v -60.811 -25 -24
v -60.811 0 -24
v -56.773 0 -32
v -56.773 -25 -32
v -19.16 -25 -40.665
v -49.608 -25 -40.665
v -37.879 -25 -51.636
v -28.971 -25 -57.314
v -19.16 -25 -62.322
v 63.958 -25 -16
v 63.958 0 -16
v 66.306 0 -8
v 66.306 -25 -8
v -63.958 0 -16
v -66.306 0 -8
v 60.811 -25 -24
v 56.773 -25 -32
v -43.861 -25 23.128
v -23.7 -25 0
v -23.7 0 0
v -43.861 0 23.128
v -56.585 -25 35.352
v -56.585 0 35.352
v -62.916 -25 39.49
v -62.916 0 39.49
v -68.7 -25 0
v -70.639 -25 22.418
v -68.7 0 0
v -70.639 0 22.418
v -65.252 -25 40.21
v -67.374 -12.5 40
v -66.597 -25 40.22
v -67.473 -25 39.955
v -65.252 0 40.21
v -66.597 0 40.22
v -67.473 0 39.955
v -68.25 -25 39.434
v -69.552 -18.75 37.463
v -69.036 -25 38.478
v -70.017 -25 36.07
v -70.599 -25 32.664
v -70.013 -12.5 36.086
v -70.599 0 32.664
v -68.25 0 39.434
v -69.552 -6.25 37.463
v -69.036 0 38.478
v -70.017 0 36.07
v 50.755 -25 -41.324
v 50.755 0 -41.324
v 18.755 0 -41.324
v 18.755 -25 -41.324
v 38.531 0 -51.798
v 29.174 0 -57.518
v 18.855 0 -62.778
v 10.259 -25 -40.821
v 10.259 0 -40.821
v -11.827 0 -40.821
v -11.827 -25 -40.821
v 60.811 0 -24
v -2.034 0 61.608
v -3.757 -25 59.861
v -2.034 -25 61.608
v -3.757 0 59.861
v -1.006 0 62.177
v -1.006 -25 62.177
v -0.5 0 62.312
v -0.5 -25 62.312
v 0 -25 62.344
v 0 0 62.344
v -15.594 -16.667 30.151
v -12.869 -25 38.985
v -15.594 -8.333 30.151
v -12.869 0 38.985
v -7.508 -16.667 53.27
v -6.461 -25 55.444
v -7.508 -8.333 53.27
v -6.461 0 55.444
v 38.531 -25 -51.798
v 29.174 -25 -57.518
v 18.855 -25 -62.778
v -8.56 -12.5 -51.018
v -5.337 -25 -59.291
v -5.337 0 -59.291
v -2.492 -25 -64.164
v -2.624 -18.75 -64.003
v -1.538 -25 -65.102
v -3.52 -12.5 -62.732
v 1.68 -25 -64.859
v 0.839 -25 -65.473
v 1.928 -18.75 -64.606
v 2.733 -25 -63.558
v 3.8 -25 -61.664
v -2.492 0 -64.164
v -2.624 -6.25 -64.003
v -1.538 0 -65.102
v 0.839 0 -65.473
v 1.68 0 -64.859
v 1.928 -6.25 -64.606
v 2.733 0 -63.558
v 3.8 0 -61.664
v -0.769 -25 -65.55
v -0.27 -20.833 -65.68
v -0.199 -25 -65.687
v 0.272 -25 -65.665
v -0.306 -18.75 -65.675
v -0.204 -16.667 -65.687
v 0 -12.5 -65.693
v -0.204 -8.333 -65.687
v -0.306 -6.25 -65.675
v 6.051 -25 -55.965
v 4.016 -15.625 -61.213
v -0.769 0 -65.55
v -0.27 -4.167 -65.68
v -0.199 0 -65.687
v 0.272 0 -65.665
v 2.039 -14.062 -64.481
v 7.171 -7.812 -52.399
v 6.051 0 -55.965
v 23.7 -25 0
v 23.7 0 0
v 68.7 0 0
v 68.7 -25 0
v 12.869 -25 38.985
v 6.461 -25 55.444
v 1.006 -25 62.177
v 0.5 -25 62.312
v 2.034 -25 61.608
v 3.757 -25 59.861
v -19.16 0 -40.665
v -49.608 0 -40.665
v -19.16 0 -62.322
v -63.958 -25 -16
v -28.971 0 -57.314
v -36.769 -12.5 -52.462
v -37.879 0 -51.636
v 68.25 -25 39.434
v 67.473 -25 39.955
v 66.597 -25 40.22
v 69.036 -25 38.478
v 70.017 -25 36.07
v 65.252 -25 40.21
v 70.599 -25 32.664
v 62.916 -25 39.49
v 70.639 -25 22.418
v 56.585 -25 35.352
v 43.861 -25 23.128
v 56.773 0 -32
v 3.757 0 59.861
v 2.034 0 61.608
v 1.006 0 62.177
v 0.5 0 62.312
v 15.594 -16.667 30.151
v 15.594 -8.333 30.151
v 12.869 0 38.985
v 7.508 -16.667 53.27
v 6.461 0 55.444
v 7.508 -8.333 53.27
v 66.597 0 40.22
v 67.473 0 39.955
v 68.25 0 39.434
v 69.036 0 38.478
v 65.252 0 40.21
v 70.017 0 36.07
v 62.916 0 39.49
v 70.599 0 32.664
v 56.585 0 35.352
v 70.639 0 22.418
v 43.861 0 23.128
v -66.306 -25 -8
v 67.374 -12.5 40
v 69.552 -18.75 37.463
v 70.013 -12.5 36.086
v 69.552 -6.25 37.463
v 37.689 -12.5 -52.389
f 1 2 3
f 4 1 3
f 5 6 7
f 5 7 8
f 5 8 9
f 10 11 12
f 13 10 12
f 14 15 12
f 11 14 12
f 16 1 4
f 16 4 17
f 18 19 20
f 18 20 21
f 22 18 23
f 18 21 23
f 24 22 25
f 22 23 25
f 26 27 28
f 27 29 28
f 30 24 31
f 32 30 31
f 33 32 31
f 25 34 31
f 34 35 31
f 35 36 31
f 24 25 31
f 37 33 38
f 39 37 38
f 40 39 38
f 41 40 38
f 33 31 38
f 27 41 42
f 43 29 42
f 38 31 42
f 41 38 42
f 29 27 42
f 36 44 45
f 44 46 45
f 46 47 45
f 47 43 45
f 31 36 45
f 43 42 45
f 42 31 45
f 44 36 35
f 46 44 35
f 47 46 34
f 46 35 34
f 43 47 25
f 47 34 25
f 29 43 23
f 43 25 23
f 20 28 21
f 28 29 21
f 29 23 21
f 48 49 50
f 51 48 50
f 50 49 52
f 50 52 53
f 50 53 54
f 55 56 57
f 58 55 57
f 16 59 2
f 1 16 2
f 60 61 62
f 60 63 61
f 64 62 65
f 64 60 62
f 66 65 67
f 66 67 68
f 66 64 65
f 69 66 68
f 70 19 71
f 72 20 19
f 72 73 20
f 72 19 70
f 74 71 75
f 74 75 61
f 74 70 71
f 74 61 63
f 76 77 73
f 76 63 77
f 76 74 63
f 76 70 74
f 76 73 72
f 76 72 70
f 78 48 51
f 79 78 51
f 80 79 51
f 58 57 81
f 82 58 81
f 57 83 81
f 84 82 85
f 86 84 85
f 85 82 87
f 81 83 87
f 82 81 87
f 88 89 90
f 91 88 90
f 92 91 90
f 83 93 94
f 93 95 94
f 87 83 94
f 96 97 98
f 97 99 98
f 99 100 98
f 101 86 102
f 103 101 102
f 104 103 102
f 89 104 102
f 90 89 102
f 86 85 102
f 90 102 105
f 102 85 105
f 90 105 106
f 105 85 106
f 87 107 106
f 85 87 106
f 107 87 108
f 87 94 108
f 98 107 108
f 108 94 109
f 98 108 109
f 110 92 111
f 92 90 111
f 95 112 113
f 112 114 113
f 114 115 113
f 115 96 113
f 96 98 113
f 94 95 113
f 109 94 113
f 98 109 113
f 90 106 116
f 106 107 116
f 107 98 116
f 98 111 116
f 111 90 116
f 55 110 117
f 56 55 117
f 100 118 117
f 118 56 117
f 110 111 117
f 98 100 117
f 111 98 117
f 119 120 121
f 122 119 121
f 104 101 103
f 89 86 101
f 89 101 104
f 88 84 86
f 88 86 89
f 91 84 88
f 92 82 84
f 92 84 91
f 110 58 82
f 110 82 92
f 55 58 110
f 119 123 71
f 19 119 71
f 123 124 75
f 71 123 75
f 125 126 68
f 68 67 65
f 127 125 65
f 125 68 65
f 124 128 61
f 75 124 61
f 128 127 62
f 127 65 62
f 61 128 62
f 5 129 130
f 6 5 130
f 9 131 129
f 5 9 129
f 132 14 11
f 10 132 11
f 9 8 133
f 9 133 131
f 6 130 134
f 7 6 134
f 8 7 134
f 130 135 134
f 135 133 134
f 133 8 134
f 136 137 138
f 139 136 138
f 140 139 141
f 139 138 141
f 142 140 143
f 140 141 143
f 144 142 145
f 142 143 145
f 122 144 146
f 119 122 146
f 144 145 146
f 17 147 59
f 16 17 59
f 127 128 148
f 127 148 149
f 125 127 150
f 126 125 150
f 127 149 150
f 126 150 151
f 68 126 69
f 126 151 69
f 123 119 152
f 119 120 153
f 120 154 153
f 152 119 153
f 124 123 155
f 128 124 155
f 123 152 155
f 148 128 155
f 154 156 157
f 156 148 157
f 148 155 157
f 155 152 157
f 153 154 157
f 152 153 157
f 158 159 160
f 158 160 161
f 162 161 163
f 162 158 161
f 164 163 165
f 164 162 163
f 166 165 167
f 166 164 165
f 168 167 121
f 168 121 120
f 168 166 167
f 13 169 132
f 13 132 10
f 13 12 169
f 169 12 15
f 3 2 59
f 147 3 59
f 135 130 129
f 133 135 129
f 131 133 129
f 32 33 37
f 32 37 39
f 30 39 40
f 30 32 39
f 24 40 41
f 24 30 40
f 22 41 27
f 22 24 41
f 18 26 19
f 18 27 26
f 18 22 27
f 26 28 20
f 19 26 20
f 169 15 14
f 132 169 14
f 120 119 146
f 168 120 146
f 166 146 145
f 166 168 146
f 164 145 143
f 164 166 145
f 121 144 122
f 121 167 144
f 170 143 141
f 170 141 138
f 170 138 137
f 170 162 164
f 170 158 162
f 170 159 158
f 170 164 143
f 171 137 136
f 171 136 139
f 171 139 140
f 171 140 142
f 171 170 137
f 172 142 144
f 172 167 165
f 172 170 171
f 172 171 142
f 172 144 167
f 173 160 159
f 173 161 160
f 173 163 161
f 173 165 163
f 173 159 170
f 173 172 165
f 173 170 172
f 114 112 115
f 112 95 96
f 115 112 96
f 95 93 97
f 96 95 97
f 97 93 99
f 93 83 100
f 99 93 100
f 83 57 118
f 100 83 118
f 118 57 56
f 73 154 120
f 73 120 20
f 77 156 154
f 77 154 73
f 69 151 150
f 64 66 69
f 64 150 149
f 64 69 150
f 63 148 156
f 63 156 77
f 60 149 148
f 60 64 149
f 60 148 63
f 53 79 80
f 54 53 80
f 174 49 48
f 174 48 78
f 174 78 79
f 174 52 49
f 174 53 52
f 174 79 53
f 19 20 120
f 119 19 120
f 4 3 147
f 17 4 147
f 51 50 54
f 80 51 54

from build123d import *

# Parameters (mm, degrees)
F1_DEPTH = 25


with BuildPart() as f1:
    # F0 (on Front) → F1 (new body)
    with BuildSketch(Plane.XZ):
        with BuildLine():
            Line((-68.6997125745, 0), (-23.6997125745, 0))
            add(Edge.make_bspline(
                [(-23.6997125745, 0), (-39.0522736523, 18.2610777884), (-77.4283213345, 63.5335866827), (-69.9814380991, 15.9987635125), (-68.6997125745, 0)],
                knots=[0, 0, 0, 0, 0.5488298185, 1, 1, 1, 1], degree=3))
        make_face()
    extrude(amount=F1_DEPTH)


with BuildPart() as f1b:
    # F0 (on Front) → F1, piece 2 (new body)
    with BuildSketch(Plane.XZ):
        with BuildLine():
            add(Edge.make_bspline(
                [(-23.6997125745, 0), (-15.7709243038, 31.3297332335), (-7.0324667798, 62.6286994315), (-1.17e-08, 62.3443424706)],
                knots=[0, 0, 0, 0, 0.5032701678, 0.5032701678, 0.5032701678, 0.5032701678], degree=3))
            Line((-23.6997125745, 0), (-18.3002874255, 0))
            add(Edge.make_bspline(
                [(-1.17e-08, 62.3443424697), (-6.9410751237, 62.0636808676), (-12.2202123623, 31.0152552891), (-18.3002874255, 0)],
                knots=[0.5032701678, 0.5032701678, 0.5032701678, 0.5032701678, 1, 1, 1, 1], degree=3))
        make_face()
        with BuildLine():
            add(Edge.make_bspline(
                [(-1.17e-08, 62.3443424697), (-6.9410751237, 62.0636808676), (-12.2202123623, 31.0152552891), (-18.3002874255, 0)],
                knots=[0.5032701678, 0.5032701678, 0.5032701678, 0.5032701678, 1, 1, 1, 1], degree=3))
            Line((-18.3002874255, 0), (0, 0))
            Line((0, 0), (18.3002874255, 0))
            add(Edge.make_bspline(
                [(-1.17e-08, 62.3443424706), (6.9410751148, 62.06368092), (12.2202123623, 31.0152552891), (18.3002874255, 0)],
                knots=[0.5032701678, 0.5032701678, 0.5032701678, 0.5032701678, 1, 1, 1, 1], degree=3))
        make_face()
        with BuildLine():
            add(Edge.make_bspline(
                [(23.6997125745, 0), (15.7709243038, 31.3297332335), (7.0324667652, 62.6286994836), (-1.17e-08, 62.3443424697)],
                knots=[0, 0, 0, 0, 0.5032701678, 0.5032701678, 0.5032701678, 0.5032701678], degree=3))
            add(Edge.make_bspline(
                [(-1.17e-08, 62.3443424706), (6.9410751148, 62.06368092), (12.2202123623, 31.0152552891), (18.3002874255, 0)],
                knots=[0.5032701678, 0.5032701678, 0.5032701678, 0.5032701678, 1, 1, 1, 1], degree=3))
            Line((18.3002874255, 0), (23.6997125745, 0))
        make_face()
    extrude(amount=F1_DEPTH)


with BuildPart() as f1c:
    # F0 (on Front) → F1, piece 3 (new body)
    with BuildSketch(Plane.XZ):
        with BuildLine():
            add(Edge.make_bspline(
                [(23.6997125745, 0), (39.0522736523, 18.2610777884), (77.4283213345, 63.5335866827), (69.9814380991, 15.9987635125), (68.6997125745, 0)],
                knots=[0, 0, 0, 0, 0.5488298185, 1, 1, 1, 1], degree=3))
            Line((23.6997125745, 0), (68.6997125745, 0))
        make_face()
    extrude(amount=F1_DEPTH)


with BuildPart() as f1d:
    # F0 (on Front) → F1, piece 4 (new body)
    with BuildSketch(Plane.XZ):
        Polygon((0, -8), (-66.3058993968, -8), (-63.9578328955, -16), (0, -16), (63.9578328955, -16), (66.3058993968, -8), align=None)
    extrude(amount=F1_DEPTH)


with BuildPart() as f1e:
    # F0 (on Front) → F1, piece 5 (new body)
    with BuildSketch(Plane.XZ):
        Polygon((0, -24), (-60.8107628588, -24), (-56.7733727334, -32), (0, -32), (56.7733727334, -32), (60.8107628588, -24), align=None)
    extrude(amount=F1_DEPTH)


with BuildPart() as f1f:
    # F0 (on Front) → F1, piece 6 (new body)
    with BuildSketch(Plane.XZ):
        with BuildLine():
            Line((-19.1602188304, -40.6652976506), (-49.6079055849, -40.6652976506))
            add(Edge.make_bspline(
                [(-49.6079055849, -40.6652976506), (-45.6042762075, -44.7987540399), (-37.323531991, -53.42044232), (-25.350073964, -59.2691873867), (-19.1602188304, -62.3217699111)],
                knots=[0, 0, 0, 0, 0.4817230649, 1, 1, 1, 1], degree=3))
            Line((-19.1602188304, -62.3217699111), (-19.1602188304, -40.6652976506))
        make_face()
    extrude(amount=F1_DEPTH)


with BuildPart() as f1g:
    # F0 (on Front) → F1, piece 7 (new body)
    with BuildSketch(Plane.XZ):
        with BuildLine():
            add(Edge.make_bspline(
                [(50.7549608034, -41.3243134417), (46.6897149867, -45.1485426126), (38.0826848799, -53.2794044405), (25.4981687947, -59.4868820492), (18.8551553599, -62.7781776149)],
                knots=[0, 0, 0, 0, 0.471510682, 1, 1, 1, 1], degree=3))
            Line((50.7549608034, -41.3243134417), (18.7549608034, -41.3243134417))
            Line((18.7549608034, -41.3243134417), (18.8551553599, -62.7781776149))
        make_face()
    extrude(amount=F1_DEPTH)


with BuildPart() as f1h:
    # F0 (on Front) → F1, piece 8 (new body)
    with BuildSketch(Plane.XZ):
        with BuildLine():
            Line((10.2589651942, -40.8205576241), (-11.8273422122, -40.8205576241))
            add(Edge.make_bspline(
                [(-11.8273422122, -40.8205576241), (-7.7598916227, -54.2035082505), (0.3132963291, -77.2394406177), (6.9613261908, -54.0939511769), (10.2589651942, -40.8205576241)],
                knots=[0, 0, 0, 0, 0.5029213178, 1, 1, 1, 1], degree=3))
        make_face()
    extrude(amount=F1_DEPTH)


solid = Compound([f1.part, f1b.part, f1c.part, f1d.part, f1e.part, f1f.part, f1g.part, f1h.part])
